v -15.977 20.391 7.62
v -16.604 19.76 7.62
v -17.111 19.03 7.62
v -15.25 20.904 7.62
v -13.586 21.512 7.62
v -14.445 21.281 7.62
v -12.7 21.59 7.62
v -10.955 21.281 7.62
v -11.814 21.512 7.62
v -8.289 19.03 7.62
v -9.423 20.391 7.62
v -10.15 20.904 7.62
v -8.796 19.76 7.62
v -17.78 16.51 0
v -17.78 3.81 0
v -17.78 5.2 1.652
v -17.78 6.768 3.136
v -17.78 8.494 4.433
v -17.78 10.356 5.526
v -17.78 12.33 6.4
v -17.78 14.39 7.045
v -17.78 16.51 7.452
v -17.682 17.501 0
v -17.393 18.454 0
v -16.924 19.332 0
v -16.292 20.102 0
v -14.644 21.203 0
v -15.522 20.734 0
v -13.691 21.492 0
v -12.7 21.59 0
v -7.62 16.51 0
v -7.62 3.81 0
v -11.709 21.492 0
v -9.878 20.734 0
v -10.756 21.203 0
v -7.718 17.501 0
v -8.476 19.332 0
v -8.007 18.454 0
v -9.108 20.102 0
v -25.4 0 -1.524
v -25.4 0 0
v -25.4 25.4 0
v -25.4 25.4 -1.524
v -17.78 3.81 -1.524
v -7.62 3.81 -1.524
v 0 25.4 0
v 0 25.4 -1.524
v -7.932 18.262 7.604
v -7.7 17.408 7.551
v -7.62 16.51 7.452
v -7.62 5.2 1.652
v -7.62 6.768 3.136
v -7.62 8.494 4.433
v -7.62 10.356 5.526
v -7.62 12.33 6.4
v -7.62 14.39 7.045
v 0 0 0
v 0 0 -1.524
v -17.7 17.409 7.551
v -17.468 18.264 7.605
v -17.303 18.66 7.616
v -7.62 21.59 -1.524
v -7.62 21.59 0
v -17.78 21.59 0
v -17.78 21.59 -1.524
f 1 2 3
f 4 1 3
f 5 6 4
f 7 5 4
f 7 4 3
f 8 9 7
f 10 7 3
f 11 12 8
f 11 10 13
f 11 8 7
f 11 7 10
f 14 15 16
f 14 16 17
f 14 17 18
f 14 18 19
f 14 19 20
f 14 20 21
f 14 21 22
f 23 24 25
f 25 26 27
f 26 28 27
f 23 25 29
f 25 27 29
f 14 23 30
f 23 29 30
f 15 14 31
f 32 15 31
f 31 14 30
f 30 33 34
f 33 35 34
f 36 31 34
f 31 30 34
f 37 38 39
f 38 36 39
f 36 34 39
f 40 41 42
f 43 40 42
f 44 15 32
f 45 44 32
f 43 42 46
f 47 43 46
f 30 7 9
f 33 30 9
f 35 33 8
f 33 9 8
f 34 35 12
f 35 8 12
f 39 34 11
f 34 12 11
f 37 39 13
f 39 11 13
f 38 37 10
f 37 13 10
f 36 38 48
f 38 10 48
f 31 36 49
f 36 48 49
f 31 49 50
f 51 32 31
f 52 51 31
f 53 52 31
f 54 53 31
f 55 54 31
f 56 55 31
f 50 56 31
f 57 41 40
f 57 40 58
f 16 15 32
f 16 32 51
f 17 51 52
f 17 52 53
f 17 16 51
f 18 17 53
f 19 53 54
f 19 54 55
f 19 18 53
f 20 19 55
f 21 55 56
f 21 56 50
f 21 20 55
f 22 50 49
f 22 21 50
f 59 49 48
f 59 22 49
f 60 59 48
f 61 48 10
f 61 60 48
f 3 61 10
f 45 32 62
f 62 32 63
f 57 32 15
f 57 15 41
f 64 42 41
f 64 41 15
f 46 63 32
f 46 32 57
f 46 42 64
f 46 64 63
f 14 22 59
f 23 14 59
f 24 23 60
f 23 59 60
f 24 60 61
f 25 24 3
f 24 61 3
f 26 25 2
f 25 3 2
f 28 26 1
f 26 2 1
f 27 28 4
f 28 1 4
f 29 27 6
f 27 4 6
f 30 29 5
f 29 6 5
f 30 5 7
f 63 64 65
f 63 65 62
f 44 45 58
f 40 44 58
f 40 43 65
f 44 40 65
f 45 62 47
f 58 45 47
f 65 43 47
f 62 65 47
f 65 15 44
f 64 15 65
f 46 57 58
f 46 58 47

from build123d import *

# Parameters (mm, degrees)
F0_W        = 10.16
F0_H        = 17.78
F1_DEPTH    = 7.62
F2_T1_DEPTH = 86.2587266768
F3_R        = 5.07999
F0_W_2      = 25.4
F0_H_2      = 25.4
F4_DEPTH    = 1.524


# Not quite as in the source:
# - a fillet or chamfer that OpenCascade refuses, or shapes differently, is made with other operations: its cross-section is extruded or revolved along the edge and cut away or added
# - a fillet or chamfer is up to 0.001 mm smaller than in the source, because OpenCascade refuses the exact size


with BuildPart() as f1:
    # F0 (on Top) → F1 (new body)
    with BuildSketch(Plane.XY):
        with Locations((-12.7, 12.7)):
            Rectangle(F0_W, F0_H)
    extrude(amount=F1_DEPTH)

    # F2: fillet of radius 19.0095175901 on 1 edges, made by hand

    # F2_s2 → F2_t1 (cut)
    with BuildSketch(Plane.YZ.offset(-55.8293633384)):
        with BuildLine():
            ThreePointArc((3.81, 0), (10.5193832973, 5.6085851567), (19.0297453354, 7.62))
            Line((19.0297453354, 7.62), (3.81, 7.62))
            Line((3.81, 7.62), (3.81, 0))
        make_face()
    extrude(amount=F2_T1_DEPTH, mode=Mode.SUBTRACT)

    # F3 (radius 5.08 in the source; OpenCascade refuses exactly that, so slightly less here)
    f3_edges = [f1.edges().sort_by_distance(p)[0] for p in [
        (-17.78, 21.59, 3.81),
        (-7.62, 21.59, 3.81),
    ]]
    fillet(f3_edges, radius=F3_R)


with BuildPart() as f4:
    # F0 (on Top) → F4 (new body)
    with BuildSketch(Plane.XY):
        with Locations((-12.7, 12.7)):
            Rectangle(F0_W_2, F0_H_2)
        with Locations((-12.7, 12.7)):
            Rectangle(F0_W, F0_H, mode=Mode.SUBTRACT)
    extrude(amount=-F4_DEPTH)


solid = Compound([f1.part, f4.part])
